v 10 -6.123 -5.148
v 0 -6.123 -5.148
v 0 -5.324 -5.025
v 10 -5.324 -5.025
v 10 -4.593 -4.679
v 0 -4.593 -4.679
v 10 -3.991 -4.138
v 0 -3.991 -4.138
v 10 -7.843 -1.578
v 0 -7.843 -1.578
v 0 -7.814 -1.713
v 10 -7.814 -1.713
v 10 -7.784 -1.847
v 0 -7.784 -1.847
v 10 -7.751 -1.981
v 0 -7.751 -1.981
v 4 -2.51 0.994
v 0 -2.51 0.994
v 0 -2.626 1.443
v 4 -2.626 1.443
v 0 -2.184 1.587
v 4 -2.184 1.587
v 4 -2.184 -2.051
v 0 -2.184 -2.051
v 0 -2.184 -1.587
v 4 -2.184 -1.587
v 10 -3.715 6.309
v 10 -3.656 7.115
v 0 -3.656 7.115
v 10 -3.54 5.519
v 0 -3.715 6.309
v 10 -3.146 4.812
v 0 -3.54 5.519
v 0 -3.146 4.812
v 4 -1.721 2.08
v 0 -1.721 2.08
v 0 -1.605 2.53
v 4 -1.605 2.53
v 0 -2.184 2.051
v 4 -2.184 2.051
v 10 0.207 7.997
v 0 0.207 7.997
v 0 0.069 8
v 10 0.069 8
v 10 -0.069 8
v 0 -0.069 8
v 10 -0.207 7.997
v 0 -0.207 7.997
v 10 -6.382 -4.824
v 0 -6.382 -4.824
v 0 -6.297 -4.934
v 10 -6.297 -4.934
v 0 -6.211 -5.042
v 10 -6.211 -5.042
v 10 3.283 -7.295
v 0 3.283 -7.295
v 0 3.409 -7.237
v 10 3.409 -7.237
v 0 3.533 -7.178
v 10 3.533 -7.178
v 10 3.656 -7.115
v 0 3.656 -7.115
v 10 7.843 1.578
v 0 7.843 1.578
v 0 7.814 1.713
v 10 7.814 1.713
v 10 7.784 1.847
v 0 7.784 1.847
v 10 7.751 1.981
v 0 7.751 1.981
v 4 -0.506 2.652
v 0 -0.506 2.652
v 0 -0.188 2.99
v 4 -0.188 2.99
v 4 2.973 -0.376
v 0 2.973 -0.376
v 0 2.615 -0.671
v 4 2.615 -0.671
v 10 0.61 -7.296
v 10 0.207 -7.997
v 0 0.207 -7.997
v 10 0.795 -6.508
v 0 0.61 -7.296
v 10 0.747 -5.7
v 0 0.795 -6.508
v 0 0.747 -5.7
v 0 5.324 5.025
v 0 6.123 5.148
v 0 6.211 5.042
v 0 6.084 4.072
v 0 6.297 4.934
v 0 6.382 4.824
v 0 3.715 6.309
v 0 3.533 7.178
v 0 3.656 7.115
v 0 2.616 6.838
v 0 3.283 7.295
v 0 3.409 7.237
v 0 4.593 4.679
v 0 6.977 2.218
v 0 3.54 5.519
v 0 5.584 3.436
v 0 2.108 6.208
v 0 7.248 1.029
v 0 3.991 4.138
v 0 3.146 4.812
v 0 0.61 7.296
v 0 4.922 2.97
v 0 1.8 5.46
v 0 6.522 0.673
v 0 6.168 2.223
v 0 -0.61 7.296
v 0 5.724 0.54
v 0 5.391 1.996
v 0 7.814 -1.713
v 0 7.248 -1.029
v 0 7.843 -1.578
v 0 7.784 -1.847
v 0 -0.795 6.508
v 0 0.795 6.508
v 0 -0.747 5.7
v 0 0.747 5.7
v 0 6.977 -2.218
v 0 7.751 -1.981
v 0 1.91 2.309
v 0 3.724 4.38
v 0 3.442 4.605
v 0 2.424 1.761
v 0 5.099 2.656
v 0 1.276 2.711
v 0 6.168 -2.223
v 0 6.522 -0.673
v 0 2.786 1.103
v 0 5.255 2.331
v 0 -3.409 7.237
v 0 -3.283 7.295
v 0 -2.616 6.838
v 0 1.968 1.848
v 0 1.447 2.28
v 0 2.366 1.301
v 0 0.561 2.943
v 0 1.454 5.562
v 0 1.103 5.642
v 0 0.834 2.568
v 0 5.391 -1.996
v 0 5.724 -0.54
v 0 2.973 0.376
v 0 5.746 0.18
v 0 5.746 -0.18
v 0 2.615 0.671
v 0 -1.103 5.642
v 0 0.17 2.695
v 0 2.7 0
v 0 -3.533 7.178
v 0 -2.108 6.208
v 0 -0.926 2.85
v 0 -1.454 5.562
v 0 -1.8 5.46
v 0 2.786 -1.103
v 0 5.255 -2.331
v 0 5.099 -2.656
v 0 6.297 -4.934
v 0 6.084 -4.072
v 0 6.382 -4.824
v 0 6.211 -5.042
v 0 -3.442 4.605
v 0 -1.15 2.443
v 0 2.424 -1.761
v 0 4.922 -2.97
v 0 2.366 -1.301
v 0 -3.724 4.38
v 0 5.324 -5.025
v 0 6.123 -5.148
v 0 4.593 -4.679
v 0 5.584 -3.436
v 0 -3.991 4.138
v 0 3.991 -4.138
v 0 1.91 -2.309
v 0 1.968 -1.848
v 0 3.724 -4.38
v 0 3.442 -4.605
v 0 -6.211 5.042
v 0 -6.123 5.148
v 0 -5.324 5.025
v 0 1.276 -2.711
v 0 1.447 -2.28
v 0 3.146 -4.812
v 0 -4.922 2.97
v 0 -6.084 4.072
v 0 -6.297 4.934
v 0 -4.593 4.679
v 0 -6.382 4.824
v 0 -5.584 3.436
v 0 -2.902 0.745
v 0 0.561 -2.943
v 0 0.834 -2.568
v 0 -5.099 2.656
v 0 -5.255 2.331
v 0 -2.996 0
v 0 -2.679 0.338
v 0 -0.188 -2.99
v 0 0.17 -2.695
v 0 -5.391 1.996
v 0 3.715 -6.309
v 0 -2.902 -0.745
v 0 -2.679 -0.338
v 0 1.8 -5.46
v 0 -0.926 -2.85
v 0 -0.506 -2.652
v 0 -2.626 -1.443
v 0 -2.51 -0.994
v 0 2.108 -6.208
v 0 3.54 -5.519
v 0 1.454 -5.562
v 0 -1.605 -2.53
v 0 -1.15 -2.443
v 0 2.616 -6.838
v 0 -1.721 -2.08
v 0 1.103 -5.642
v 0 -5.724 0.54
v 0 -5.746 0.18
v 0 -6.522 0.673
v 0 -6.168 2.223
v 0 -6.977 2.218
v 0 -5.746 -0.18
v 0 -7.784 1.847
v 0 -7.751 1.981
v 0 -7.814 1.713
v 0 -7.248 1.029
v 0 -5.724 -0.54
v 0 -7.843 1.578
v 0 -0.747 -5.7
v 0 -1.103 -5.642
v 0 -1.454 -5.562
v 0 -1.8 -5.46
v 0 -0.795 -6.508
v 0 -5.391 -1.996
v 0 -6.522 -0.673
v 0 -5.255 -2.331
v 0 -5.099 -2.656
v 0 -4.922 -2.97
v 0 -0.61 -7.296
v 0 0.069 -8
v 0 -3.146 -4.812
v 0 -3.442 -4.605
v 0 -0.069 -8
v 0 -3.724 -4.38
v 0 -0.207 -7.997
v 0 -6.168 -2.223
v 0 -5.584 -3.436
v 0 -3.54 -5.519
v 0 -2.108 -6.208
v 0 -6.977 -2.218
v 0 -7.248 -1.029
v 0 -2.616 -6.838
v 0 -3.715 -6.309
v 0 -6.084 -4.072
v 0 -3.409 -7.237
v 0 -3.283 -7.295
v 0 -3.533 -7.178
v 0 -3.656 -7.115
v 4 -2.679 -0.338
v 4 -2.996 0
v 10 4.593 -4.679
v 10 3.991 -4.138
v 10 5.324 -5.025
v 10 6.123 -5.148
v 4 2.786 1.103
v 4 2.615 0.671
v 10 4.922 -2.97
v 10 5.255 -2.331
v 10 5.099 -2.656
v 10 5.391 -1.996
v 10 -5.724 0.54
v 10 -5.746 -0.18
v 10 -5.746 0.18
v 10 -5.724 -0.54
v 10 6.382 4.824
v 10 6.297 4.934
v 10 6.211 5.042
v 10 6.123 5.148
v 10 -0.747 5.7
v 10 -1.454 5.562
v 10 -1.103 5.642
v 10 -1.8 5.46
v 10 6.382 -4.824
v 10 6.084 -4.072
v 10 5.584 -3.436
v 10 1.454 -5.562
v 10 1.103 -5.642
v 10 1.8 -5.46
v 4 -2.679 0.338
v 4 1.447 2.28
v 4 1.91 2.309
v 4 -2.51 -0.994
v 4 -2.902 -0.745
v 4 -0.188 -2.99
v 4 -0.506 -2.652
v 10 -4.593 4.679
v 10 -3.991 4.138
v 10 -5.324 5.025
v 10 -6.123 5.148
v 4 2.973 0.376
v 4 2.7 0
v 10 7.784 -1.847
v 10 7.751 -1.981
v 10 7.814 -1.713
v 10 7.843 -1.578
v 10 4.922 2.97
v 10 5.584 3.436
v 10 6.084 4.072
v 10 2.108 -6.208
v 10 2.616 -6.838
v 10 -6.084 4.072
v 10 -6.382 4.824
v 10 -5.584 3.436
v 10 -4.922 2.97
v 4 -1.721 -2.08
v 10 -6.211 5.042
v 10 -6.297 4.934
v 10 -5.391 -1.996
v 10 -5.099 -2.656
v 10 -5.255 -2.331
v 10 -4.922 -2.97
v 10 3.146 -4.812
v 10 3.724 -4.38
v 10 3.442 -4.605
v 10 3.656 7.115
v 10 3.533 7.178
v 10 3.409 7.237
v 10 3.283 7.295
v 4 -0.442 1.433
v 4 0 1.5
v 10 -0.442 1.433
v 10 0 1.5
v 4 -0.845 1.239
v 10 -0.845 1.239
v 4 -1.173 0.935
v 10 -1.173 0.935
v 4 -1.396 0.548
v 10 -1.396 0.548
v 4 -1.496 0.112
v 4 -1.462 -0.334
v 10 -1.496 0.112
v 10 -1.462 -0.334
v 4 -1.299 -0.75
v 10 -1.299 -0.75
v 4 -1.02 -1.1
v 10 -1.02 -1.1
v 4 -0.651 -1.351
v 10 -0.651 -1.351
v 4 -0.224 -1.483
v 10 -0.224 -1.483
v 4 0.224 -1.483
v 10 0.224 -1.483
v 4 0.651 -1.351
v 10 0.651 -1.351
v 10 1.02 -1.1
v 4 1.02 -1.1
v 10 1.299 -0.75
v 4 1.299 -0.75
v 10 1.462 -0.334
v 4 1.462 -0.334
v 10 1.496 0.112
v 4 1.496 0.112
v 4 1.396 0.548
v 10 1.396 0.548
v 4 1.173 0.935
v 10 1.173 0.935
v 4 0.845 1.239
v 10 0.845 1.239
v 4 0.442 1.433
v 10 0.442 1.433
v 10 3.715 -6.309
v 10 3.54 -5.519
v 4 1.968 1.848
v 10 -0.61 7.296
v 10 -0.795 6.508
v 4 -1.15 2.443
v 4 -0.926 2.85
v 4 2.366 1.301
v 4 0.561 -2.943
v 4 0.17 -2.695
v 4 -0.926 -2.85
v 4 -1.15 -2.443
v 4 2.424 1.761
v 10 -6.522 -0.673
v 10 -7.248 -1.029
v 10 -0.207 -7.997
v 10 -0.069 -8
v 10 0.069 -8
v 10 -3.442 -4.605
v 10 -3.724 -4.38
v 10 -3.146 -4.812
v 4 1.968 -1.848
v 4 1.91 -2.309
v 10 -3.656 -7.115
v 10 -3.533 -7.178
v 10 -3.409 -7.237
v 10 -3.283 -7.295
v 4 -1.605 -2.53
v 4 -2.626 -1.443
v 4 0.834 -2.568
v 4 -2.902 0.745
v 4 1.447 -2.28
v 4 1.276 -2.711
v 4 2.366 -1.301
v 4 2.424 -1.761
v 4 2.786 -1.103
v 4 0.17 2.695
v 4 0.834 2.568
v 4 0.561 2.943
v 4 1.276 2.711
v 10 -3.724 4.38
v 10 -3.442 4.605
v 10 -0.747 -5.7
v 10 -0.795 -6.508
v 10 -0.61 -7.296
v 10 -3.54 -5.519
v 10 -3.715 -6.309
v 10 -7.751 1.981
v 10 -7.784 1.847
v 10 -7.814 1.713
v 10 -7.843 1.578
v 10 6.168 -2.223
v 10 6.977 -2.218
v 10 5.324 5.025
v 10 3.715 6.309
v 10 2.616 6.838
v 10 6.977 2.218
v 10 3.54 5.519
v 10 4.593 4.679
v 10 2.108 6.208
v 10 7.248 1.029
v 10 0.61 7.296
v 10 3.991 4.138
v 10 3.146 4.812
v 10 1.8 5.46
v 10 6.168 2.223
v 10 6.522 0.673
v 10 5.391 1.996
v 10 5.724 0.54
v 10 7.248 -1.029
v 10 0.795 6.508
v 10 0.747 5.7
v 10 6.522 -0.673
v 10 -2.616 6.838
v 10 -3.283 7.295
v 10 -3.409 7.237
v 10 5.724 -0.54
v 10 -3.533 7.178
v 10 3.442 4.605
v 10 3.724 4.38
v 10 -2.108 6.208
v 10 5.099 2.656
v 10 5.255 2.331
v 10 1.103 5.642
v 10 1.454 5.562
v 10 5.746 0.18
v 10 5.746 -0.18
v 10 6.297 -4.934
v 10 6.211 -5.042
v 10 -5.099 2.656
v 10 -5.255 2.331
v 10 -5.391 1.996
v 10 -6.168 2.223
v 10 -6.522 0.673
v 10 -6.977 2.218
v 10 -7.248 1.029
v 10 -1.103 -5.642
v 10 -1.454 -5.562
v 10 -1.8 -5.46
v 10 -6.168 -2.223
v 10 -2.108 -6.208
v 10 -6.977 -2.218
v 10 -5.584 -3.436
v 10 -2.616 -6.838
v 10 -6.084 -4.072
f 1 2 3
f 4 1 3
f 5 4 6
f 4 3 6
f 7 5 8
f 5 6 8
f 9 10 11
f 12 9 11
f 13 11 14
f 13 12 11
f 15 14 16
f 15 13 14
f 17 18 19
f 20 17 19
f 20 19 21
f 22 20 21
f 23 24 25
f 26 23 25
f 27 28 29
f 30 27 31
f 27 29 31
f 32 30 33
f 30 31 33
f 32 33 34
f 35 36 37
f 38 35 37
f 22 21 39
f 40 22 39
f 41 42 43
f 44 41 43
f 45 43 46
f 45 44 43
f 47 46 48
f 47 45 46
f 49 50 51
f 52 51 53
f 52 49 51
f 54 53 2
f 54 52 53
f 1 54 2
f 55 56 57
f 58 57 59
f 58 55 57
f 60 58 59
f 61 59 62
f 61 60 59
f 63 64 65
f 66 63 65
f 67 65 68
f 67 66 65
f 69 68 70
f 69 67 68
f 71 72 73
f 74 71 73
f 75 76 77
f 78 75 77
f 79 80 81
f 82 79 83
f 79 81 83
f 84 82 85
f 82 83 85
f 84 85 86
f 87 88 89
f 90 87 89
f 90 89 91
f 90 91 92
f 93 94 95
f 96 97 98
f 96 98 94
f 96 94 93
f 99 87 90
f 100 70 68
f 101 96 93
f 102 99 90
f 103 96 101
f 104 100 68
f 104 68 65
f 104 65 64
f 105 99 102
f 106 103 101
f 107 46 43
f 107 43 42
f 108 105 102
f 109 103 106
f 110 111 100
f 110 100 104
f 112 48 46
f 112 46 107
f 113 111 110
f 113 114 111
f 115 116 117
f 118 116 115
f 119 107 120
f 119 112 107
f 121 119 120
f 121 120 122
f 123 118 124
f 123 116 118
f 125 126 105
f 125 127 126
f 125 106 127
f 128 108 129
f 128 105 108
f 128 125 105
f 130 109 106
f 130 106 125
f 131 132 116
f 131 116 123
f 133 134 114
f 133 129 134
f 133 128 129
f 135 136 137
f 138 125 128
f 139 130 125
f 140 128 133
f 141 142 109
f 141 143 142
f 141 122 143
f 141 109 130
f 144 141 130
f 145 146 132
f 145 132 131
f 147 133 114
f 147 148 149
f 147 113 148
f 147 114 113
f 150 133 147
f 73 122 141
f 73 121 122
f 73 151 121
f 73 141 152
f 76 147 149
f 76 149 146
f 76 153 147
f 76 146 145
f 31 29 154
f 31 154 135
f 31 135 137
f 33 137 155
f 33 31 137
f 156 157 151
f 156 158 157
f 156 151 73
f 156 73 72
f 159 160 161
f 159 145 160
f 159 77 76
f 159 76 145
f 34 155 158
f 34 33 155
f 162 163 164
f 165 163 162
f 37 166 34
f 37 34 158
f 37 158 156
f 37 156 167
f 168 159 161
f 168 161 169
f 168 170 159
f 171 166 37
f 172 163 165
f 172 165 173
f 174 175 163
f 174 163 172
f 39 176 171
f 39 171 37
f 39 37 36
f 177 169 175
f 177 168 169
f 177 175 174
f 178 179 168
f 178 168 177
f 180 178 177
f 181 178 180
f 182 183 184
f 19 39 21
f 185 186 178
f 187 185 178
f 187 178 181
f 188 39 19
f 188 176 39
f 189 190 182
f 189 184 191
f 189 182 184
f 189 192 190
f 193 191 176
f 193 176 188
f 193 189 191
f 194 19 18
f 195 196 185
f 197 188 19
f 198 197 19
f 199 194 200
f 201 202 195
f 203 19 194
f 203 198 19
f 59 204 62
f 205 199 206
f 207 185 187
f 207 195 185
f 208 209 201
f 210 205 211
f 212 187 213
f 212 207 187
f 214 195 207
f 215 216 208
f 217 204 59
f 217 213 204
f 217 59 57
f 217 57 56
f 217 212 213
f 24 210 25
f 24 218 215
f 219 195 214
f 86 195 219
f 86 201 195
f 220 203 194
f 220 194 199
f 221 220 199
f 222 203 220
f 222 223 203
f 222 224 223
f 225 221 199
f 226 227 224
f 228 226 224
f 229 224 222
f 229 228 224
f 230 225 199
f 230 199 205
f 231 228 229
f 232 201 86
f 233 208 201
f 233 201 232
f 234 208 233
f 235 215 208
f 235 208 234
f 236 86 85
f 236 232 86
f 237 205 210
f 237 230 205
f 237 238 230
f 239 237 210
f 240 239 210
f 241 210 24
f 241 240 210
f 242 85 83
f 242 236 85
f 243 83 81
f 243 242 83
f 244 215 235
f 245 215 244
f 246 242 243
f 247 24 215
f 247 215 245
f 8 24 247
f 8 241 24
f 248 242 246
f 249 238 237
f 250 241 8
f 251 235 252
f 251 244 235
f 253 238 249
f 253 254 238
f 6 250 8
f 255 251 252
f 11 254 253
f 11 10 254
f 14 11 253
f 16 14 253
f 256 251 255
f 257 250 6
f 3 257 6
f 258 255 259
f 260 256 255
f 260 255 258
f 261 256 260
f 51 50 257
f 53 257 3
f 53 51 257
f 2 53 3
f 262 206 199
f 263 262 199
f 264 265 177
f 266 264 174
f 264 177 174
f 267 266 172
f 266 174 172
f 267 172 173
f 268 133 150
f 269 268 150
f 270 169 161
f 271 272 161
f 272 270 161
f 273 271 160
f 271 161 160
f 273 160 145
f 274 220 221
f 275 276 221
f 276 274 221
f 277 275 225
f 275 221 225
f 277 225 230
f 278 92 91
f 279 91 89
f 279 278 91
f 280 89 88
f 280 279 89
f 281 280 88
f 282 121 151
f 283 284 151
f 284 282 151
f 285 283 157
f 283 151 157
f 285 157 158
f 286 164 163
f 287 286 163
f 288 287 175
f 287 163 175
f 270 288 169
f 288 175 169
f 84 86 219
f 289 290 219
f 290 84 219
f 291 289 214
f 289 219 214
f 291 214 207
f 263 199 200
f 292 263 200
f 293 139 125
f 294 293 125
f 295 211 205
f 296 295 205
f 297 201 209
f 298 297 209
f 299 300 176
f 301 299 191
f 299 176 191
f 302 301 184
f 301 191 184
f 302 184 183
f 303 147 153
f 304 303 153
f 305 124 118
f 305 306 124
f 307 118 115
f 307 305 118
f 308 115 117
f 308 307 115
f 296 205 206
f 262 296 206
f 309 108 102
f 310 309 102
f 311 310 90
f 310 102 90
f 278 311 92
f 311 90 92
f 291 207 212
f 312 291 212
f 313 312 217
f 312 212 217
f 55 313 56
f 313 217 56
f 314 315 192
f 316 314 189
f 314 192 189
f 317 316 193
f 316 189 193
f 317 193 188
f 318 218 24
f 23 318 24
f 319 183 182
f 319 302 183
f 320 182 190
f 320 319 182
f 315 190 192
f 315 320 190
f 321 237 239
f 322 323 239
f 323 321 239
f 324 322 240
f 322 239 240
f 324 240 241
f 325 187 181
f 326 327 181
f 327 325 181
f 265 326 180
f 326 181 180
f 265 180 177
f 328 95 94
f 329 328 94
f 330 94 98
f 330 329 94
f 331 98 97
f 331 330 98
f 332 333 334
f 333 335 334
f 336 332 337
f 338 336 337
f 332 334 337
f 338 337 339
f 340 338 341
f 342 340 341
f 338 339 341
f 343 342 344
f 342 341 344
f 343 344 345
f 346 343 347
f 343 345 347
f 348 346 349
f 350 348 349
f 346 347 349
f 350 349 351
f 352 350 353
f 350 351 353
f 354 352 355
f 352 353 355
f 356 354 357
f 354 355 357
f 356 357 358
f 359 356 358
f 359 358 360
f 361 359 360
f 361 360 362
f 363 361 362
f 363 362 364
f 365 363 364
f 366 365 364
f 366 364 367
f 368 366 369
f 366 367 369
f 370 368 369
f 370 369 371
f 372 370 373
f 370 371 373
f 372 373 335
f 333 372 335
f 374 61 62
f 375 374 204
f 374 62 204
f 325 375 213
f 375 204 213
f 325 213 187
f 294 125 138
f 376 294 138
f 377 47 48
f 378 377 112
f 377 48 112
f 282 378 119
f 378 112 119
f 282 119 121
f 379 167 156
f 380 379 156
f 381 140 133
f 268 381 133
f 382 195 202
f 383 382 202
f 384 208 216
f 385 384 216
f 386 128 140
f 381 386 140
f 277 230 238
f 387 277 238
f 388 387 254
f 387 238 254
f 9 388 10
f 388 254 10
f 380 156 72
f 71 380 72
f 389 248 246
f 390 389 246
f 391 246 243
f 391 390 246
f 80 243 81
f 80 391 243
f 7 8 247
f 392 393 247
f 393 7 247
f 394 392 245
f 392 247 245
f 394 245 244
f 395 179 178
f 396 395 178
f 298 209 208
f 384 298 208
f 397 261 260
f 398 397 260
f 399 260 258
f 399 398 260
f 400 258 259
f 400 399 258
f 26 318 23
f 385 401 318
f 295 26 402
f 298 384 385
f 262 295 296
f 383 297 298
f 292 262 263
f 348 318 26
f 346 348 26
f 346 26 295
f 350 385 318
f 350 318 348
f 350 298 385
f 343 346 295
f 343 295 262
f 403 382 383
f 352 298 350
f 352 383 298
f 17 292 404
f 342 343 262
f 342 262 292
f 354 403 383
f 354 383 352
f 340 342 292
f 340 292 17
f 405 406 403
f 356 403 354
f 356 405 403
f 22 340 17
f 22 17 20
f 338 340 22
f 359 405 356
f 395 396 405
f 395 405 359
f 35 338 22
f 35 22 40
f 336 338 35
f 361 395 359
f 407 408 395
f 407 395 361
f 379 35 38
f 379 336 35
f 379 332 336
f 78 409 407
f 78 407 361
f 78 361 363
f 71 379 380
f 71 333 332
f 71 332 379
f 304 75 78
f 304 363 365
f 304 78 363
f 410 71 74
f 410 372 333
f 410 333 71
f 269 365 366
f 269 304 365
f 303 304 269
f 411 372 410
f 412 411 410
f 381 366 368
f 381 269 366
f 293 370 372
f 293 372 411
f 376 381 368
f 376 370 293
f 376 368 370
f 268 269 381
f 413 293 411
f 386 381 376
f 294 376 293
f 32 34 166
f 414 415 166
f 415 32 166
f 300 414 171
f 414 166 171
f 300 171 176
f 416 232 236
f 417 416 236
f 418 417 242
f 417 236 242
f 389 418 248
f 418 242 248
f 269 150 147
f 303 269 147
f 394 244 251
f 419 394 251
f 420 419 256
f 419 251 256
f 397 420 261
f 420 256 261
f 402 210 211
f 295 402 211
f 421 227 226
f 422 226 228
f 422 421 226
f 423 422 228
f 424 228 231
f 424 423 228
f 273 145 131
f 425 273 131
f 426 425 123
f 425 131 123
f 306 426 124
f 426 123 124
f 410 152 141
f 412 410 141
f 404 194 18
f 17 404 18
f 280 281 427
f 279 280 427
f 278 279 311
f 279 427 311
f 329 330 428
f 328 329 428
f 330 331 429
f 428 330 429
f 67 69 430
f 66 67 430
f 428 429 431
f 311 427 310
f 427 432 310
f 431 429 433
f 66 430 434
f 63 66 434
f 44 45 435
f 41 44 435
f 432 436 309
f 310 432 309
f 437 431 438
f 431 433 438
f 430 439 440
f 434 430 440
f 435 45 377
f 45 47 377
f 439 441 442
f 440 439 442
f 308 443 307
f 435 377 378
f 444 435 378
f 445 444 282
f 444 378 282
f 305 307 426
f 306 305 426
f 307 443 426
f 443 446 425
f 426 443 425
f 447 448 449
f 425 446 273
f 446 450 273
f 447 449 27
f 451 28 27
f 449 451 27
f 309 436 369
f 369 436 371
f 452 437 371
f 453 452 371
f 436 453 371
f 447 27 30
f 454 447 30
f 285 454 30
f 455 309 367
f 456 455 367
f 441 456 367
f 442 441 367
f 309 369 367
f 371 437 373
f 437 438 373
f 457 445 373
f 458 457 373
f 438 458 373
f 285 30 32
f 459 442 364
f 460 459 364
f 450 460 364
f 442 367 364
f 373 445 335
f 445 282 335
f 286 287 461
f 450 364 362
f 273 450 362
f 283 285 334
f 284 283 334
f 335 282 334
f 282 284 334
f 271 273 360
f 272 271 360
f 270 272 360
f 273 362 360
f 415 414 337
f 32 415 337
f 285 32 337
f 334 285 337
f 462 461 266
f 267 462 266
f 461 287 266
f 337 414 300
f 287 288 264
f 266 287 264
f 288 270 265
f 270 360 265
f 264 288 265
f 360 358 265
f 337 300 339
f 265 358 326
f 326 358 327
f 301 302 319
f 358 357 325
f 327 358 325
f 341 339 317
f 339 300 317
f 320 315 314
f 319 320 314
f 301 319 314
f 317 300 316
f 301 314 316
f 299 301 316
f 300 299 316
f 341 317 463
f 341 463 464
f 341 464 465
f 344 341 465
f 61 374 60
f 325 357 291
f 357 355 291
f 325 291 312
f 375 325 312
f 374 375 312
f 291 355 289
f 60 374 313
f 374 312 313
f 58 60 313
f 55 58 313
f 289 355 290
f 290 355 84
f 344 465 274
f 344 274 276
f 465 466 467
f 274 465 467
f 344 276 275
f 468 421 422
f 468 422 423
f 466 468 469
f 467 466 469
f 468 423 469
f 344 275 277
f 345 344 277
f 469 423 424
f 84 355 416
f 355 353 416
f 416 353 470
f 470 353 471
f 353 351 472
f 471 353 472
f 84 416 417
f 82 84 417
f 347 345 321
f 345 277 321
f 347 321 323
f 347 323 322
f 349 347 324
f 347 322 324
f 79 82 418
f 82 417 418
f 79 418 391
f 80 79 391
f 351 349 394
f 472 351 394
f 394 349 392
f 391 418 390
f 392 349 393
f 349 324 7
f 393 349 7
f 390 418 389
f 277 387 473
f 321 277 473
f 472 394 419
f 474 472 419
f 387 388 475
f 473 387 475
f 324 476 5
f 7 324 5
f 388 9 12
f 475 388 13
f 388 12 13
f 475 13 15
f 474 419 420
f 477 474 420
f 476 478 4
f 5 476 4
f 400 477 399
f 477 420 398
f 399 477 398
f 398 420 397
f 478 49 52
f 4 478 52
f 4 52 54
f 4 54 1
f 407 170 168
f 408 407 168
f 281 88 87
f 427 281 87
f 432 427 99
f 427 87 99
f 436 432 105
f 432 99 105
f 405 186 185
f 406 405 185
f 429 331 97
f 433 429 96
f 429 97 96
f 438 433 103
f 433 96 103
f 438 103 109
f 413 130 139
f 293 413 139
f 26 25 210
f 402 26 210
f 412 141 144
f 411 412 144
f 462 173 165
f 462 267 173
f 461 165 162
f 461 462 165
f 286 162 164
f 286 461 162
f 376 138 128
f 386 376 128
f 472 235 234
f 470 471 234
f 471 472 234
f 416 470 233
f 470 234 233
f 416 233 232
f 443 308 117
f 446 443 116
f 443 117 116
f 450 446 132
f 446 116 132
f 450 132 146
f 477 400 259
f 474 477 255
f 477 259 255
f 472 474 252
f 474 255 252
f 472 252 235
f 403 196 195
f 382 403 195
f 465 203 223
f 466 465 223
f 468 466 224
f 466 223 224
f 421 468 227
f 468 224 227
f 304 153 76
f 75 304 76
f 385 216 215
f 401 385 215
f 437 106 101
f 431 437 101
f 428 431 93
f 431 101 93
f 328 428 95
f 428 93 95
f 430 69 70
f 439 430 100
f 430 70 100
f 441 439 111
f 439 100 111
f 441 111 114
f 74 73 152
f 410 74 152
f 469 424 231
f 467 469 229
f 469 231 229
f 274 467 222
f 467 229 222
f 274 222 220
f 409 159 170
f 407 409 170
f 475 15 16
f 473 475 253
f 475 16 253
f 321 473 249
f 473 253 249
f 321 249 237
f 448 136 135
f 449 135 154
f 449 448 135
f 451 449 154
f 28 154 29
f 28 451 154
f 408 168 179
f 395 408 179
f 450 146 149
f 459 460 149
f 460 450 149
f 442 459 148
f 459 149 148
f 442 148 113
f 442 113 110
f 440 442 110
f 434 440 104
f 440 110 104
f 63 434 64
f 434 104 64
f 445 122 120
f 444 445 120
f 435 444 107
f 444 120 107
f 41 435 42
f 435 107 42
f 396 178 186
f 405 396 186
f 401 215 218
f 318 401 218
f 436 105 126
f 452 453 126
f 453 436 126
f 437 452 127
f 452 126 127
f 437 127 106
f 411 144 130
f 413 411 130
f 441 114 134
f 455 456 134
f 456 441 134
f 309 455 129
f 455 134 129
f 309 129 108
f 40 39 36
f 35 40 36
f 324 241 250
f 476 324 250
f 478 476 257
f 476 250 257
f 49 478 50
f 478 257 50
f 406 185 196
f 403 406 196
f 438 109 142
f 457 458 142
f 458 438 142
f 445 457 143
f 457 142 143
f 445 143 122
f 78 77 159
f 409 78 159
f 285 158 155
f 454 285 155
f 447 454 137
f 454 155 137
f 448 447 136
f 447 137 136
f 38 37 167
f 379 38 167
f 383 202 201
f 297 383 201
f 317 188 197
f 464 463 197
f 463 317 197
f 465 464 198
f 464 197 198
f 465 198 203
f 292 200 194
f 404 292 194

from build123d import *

# Parameters (mm, degrees)
BASPROSKE_W        = 10
BASPROSKE_H        = 8
TOOTHCUT_DEPTH     = 16.099668871
TEETHCUTS_COUNT    = 14
TEETHCUTS_ANGLE    = 334.285714286
BORSKE_R           = 1.5
BORE_DEPTH         = 50.0000508
CUT_EXTRUDE1_DEPTH = 4


with BuildPart() as part:
    # BasProSke → Base-Revolve (revolve)
    with BuildSketch(Plane(origin=(0, 0, 0), x_dir=(1, 0, 0), z_dir=(0, 1, 0)), mode=Mode.PRIVATE) as base_revolve_sk:
        with Locations((5, 4)):
            Rectangle(BASPROSKE_W, BASPROSKE_H)
    revolve(base_revolve_sk.sketch.rotate(Axis((-10, 0, 0), (1, 0, 0)), 180), axis=Axis((-10, 0, 0), (1, 0, 0)))

    # TooCutSke → ToothCut (cut, through all)
    with BuildSketch(Plane(origin=(0, 0, 0), x_dir=(0, 0, -1), z_dir=(1, 0, 0))):
        with BuildLine():
            ThreePointArc((0.540393256, 5.723545765), (0, 5.749), (-0.540393256, 5.723545765))
            ThreePointArc((-0.540393256, 5.723545765), (-0.832220085, 6.912663993), (-1.603550271, 7.863566092))
            ThreePointArc((-1.603550271, 7.863566092), (0, 8.0254), (1.603550271, 7.863566092))
            ThreePointArc((1.603550271, 7.863566092), (0.832220085, 6.912663993), (0.540393256, 5.723545765))
        make_face()
    toothcut = extrude(amount=TOOTHCUT_DEPTH, mode=Mode.SUBTRACT)

    # TeethCuts: ToothCut ×14 about axis
    teethcuts_axis = Axis((-10, 0, 0), (1, 0, 0))
    for i in range(1, TEETHCUTS_COUNT):
        add(toothcut.rotate(teethcuts_axis, i * TEETHCUTS_ANGLE / (TEETHCUTS_COUNT - 1)), mode=Mode.SUBTRACT)

    # BorSke → Bore (cut, symmetric)
    with BuildSketch(Plane(origin=(0, 0, 0), x_dir=(0, 0, -1), z_dir=(1, 0, 0))):
        with Locations(Location((0, 0, 0), (0, 0, 180))):
            Circle(BORSKE_R)
    extrude(amount=BORE_DEPTH, both=True, mode=Mode.SUBTRACT)

    # Sketch1 → Cut-Extrude1 (cut)
    with BuildSketch(Plane.ZY):
        Polygon((0.37552517, 2.972587809), (0, 2.7), (-0.37552517, 2.972587809), (-0.671462695, 2.615174535), (-1.102979883, 2.785809184), (-1.30073492, 2.366028036), (-1.761130314, 2.423987923), (-1.848277186, 1.968215294), (-2.308622449, 1.909858586), (-2.279685399, 1.446732346), (-2.711055346, 1.27572581), (-2.567852594, 0.834345885), (-2.943142665, 0.56143449), (-2.694672167, 0.169534403), (-2.990301506, -0.188133824), (-2.652175577, -0.505929549), (-2.849568706, -0.925880998), (-2.443033042, -1.149604087), (-2.529787024, -1.605451664), (-2.080385755, -1.721044772), (-2.05104952, -2.184145897), (-1.587020181, -2.184345885), (-1.44343703, -2.625602211), (-0.993936292, -2.510396512), (-0.745128084, -2.902082282), (-0.338399731, -2.678709694), (0, -2.99621385), (0.338399731, -2.678709694), (0.745128084, -2.902082282), (0.993936292, -2.510396512), (1.44343703, -2.625602211), (1.587020181, -2.184345885), (2.05104952, -2.184145897), (2.080385755, -1.721044772), (2.529787024, -1.605451664), (2.443033042, -1.149604087), (2.849568706, -0.925880998), (2.652175577, -0.505929549), (2.990301506, -0.188133824), (2.694672167, 0.169534403), (2.943142665, 0.56143449), (2.567852594, 0.834345885), (2.711055346, 1.27572581), (2.279685399, 1.446732346), (2.308622449, 1.909858586), (1.848277186, 1.968215294), (1.761130314, 2.423987923), (1.30073492, 2.366028036), (1.102979883, 2.785809184), (0.671462695, 2.615174535), align=None)
    extrude(amount=-CUT_EXTRUDE1_DEPTH, mode=Mode.SUBTRACT)


solid = part.part
